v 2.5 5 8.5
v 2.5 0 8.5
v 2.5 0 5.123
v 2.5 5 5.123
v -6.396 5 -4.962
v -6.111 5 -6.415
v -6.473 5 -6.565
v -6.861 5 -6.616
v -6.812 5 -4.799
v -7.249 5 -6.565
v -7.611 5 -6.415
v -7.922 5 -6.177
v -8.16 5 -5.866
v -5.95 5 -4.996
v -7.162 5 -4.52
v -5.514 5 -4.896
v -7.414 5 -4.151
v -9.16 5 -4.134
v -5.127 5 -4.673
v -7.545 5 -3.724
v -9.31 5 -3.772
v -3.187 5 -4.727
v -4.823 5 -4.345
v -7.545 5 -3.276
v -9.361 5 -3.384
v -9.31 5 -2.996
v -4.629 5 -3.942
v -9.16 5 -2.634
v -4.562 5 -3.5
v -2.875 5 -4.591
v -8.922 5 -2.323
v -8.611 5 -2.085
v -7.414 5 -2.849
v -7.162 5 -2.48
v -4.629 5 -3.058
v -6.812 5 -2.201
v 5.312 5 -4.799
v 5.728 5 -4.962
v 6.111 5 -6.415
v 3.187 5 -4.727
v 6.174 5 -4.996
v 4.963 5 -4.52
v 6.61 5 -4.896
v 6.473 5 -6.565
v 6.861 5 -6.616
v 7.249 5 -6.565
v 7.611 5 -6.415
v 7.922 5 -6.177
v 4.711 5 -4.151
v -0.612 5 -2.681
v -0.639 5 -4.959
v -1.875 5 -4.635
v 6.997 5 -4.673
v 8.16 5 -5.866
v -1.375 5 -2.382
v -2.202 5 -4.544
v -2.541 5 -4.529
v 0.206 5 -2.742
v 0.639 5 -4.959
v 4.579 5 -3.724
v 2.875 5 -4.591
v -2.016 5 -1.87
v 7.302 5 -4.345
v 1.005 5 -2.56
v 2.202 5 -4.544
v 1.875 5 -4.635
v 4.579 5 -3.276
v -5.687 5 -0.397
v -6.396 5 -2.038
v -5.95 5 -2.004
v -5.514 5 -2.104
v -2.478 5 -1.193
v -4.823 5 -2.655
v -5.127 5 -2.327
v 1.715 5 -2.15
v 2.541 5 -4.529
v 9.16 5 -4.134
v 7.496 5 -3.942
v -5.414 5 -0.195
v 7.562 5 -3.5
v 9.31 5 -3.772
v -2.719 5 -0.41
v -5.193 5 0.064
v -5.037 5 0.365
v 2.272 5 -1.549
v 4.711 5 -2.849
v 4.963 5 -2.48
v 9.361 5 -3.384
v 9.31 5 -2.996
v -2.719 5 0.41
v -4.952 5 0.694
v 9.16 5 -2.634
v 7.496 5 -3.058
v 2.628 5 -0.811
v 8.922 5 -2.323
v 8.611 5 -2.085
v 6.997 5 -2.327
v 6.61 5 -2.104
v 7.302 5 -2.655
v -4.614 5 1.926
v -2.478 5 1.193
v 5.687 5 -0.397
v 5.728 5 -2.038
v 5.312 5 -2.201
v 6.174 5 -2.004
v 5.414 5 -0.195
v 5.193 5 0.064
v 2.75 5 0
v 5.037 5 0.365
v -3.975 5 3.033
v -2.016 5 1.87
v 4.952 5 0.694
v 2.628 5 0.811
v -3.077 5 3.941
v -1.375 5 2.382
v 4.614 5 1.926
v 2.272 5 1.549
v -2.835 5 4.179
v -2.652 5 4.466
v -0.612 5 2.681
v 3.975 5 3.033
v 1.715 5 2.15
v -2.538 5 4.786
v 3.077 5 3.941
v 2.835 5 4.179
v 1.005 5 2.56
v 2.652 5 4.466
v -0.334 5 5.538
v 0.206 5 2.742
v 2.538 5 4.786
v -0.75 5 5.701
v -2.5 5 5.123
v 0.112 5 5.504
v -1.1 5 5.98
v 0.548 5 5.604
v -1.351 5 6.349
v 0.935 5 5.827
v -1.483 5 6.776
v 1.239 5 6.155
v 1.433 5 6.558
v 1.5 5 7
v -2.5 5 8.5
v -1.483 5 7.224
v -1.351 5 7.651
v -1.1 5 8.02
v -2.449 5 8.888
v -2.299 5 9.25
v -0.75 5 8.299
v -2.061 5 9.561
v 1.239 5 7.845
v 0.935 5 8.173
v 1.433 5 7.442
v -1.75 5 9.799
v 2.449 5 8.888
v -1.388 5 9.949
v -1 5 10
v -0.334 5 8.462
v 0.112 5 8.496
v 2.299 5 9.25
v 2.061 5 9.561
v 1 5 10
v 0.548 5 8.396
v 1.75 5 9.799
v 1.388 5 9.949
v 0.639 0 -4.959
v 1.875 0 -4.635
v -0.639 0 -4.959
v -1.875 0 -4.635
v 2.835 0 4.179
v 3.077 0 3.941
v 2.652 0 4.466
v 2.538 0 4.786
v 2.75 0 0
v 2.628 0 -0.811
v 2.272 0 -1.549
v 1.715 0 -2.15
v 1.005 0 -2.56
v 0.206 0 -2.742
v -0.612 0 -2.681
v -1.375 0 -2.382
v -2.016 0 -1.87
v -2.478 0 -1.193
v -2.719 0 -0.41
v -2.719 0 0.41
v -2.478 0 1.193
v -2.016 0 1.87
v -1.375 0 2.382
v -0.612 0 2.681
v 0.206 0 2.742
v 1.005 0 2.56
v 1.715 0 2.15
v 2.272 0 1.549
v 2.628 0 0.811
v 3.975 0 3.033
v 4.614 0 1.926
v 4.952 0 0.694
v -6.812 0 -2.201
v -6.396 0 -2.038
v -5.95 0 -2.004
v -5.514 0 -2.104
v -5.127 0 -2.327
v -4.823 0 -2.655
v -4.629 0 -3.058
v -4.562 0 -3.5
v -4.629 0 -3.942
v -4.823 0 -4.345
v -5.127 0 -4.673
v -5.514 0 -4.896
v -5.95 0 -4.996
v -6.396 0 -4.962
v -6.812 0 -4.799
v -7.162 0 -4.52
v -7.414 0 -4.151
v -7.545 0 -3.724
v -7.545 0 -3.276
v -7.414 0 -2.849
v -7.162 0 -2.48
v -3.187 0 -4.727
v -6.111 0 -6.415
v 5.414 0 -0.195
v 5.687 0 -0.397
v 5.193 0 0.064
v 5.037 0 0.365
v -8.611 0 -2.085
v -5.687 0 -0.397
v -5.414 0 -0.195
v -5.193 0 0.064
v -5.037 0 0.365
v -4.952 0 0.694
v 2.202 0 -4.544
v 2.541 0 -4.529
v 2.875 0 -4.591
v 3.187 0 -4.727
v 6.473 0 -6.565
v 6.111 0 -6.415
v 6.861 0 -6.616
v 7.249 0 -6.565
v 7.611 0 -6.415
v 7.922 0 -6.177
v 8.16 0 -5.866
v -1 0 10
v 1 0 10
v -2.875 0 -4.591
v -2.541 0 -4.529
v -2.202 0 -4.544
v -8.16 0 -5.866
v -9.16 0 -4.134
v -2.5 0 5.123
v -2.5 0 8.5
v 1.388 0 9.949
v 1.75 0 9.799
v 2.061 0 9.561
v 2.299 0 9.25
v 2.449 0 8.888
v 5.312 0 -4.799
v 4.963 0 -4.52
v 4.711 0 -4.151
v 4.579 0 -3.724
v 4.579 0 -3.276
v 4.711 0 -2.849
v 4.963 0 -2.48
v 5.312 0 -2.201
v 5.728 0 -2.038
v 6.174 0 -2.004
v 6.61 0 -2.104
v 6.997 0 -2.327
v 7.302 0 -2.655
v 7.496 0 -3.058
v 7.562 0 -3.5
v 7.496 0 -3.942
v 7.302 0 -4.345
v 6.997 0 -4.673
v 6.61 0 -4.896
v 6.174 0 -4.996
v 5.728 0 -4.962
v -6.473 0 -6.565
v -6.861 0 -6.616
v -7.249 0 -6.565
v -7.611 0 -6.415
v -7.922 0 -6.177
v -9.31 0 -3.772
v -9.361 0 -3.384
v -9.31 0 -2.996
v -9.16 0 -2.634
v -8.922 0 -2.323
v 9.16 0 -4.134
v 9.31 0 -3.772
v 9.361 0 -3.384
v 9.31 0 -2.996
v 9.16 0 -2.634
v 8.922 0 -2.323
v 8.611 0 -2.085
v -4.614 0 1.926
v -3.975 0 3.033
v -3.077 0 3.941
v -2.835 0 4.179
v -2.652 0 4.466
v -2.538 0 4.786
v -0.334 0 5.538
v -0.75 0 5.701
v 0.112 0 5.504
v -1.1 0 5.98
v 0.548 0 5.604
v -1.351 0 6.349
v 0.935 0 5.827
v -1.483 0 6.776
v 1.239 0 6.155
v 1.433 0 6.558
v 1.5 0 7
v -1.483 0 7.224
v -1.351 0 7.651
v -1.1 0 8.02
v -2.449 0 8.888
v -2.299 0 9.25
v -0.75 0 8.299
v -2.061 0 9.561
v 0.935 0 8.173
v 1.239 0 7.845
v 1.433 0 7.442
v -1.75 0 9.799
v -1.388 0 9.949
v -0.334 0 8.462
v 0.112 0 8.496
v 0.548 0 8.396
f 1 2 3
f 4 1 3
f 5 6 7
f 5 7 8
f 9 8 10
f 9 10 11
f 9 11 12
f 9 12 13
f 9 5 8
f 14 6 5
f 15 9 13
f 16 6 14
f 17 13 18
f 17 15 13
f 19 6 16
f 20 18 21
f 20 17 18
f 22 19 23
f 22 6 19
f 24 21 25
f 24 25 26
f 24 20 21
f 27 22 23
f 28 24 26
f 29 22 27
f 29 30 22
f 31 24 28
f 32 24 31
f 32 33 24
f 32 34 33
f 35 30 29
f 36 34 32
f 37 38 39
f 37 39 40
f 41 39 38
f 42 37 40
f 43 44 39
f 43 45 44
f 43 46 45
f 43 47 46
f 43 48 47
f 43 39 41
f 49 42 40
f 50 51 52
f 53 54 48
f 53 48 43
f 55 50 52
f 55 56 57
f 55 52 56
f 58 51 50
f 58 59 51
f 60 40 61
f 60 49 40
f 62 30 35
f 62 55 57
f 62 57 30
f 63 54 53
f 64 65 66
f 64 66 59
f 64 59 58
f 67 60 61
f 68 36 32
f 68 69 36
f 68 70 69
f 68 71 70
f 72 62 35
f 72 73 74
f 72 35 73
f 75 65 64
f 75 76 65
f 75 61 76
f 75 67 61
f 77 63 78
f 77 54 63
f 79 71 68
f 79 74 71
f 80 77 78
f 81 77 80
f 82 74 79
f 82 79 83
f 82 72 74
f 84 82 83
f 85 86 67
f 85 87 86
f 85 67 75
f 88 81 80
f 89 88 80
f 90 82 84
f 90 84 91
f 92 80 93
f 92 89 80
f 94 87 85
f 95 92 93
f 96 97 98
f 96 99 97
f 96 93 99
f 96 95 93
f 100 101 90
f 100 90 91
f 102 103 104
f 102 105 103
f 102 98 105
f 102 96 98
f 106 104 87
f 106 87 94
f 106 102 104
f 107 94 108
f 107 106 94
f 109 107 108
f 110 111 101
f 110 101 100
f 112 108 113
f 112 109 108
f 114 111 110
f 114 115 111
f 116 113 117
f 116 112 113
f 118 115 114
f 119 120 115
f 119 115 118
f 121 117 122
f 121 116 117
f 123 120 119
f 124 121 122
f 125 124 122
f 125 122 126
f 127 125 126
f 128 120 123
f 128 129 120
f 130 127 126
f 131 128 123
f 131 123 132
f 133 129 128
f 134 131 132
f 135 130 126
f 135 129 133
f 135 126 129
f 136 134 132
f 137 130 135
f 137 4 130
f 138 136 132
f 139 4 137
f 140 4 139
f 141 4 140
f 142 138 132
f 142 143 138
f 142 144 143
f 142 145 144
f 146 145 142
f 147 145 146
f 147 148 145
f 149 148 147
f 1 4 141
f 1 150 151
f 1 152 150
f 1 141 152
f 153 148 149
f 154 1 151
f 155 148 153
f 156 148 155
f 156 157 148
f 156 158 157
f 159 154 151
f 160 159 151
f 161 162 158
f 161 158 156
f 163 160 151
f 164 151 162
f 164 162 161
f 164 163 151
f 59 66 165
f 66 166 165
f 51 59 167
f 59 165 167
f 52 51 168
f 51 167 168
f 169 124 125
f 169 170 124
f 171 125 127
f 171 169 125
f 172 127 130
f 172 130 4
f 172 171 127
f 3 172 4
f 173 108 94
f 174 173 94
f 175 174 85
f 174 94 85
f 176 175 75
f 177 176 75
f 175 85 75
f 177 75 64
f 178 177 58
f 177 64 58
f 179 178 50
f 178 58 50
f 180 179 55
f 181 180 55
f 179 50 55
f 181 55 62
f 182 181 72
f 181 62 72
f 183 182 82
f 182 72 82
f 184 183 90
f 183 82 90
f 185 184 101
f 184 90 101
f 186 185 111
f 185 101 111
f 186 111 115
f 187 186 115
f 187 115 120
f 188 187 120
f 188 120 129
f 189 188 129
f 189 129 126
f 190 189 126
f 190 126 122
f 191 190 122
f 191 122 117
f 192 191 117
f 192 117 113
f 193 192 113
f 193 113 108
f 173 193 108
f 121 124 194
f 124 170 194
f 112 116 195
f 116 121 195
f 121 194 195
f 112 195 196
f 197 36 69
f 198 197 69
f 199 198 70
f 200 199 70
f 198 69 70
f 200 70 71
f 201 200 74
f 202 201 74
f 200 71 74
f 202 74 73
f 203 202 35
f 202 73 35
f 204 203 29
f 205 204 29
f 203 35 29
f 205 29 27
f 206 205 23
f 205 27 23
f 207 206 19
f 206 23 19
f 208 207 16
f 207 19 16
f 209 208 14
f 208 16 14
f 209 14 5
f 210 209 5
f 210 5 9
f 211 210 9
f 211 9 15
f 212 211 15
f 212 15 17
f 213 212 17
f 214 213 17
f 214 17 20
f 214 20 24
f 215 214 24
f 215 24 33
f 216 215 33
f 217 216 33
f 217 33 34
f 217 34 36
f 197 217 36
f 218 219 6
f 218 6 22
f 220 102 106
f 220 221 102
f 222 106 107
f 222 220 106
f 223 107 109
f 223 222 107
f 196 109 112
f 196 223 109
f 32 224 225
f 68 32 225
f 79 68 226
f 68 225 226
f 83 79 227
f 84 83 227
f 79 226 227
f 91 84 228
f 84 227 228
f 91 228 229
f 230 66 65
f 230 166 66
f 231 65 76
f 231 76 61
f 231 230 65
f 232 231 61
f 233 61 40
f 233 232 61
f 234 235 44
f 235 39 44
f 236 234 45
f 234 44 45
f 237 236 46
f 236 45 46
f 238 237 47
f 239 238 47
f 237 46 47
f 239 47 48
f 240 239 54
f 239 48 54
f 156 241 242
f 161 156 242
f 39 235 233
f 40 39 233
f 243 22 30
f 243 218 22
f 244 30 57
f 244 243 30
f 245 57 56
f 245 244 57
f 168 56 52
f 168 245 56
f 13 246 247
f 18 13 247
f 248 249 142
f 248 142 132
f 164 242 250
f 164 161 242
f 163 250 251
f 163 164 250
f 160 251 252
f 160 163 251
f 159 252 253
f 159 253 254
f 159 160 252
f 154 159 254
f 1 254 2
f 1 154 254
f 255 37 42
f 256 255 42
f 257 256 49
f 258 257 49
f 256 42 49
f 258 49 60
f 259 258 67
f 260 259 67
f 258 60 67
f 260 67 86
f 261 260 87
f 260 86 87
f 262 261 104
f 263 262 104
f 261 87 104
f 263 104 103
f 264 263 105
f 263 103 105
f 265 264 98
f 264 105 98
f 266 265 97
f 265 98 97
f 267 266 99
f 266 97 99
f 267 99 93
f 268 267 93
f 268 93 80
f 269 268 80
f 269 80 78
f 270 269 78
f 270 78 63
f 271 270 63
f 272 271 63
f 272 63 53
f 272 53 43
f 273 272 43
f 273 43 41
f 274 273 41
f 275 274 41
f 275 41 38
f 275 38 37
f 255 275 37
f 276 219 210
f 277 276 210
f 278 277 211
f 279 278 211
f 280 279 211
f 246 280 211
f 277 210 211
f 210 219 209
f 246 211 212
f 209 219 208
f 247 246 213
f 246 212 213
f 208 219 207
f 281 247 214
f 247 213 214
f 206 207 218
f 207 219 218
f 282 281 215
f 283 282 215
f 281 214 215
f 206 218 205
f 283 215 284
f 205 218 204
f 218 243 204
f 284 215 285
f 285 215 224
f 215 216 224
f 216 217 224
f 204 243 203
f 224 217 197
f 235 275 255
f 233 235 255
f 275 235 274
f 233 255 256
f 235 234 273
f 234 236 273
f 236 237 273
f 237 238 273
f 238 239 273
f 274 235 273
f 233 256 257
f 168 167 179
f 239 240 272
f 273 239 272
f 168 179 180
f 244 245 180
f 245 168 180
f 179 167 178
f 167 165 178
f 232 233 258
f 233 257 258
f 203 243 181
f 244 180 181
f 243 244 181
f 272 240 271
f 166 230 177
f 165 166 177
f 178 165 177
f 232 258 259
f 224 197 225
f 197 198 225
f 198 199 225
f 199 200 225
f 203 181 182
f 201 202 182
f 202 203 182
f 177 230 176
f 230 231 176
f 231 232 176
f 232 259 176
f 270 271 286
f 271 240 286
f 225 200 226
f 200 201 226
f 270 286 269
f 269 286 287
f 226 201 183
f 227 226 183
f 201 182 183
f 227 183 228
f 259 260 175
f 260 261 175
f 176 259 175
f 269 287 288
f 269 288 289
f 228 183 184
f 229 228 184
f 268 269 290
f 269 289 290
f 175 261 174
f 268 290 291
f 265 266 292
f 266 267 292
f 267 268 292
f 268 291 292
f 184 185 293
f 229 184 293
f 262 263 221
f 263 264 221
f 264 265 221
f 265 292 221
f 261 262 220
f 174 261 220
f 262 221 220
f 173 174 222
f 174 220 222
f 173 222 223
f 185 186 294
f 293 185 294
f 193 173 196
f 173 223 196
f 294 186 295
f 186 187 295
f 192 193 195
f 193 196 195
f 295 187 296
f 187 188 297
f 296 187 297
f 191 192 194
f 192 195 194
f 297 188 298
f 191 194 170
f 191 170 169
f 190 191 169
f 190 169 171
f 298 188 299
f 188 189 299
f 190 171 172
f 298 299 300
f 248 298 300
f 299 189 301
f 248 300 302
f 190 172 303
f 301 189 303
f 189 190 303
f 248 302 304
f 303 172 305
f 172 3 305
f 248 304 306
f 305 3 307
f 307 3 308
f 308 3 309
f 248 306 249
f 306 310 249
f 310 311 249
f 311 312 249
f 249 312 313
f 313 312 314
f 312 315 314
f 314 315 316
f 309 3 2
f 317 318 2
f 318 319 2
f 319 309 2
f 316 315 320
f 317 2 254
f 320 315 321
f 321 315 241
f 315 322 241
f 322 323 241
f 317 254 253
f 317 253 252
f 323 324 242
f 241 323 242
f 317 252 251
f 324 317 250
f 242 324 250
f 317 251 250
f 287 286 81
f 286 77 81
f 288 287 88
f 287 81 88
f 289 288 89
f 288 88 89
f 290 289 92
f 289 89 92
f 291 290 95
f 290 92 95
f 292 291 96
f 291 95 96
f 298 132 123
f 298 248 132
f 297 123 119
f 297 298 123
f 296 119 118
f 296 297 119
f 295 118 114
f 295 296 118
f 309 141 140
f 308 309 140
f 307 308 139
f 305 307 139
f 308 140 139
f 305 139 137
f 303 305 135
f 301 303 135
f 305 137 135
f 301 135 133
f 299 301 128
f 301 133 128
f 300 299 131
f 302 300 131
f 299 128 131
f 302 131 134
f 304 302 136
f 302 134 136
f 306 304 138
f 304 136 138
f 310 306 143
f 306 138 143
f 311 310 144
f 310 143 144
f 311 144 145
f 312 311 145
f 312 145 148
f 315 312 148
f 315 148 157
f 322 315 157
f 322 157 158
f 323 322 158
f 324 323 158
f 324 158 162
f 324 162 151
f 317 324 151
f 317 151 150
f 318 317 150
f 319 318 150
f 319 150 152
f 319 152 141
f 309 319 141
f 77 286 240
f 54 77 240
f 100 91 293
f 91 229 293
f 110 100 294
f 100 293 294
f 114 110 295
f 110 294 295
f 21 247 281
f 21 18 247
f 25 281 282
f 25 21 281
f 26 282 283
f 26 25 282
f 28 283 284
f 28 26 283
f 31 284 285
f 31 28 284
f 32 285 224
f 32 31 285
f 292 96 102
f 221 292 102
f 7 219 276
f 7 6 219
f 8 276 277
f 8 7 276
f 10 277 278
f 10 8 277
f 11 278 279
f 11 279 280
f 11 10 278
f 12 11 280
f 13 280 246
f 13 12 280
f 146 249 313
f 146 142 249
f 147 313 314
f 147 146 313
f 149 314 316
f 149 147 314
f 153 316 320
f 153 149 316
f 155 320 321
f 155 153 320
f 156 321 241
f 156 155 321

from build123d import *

# Parameters (mm, degrees)
SKETCH1_R                = 5
BOSS_EXTRUDE1_DEPTH      = 5
SKETCH2_W                = 5
SKETCH2_H                = 10
BOSS_EXTRUDE2_DEPTH      = 5
SKETCH3_R                = 1.5
CUT_EXTRUDE1_DEPTH       = 6
FILLET1_R                = 1.5
CIRPATTERN1_COUNT        = 3
FILLET1_OF_CIRPATTERN1_R = 1.5
SKETCH4_R                = 2.75
CUT_EXTRUDE2_DEPTH       = 6


with BuildPart() as part:
    # Sketch1 → Boss-Extrude1 (new body)
    with BuildSketch(Plane(origin=(0, 0, 0), x_dir=(1, 0, 0), z_dir=(0, 1, 0))):
        Circle(SKETCH1_R)
    extrude(amount=BOSS_EXTRUDE1_DEPTH)

    # Sketch2 → Boss-Extrude2 (add)
    with BuildSketch(Plane(origin=(0, 0, 0), x_dir=(1, 0, 0), z_dir=(0, 1, 0))):
        with Locations((0, -5)):
            Rectangle(SKETCH2_W, SKETCH2_H)
    boss_extrude2 = extrude(amount=BOSS_EXTRUDE2_DEPTH)

    # Sketch3 → Cut-Extrude1 (cut, through all)
    with BuildSketch(Plane(origin=(0, 5, 0), x_dir=(1, 0, 0), z_dir=(0, 1, 0))):
        with Locations((0, -7)):
            Circle(SKETCH3_R)
    cut_extrude1 = extrude(amount=-CUT_EXTRUDE1_DEPTH, mode=Mode.SUBTRACT)

    # Fillet1
    fillet1_edges = [part.edges().sort_by_distance(p)[0] for p in [
        (2.5, 2.5, 4.330127019),
        (2.5, 2.5, 10),
        (-2.5, 2.5, 4.330127019),
        (-2.5, 2.5, 10),
    ]]
    fillet(fillet1_edges, radius=FILLET1_R)

    # CirPattern1: Boss-Extrude2, Cut-Extrude1 ×3 about axis
    cirpattern1_axis = Axis((0, 0, 0), (0, 1, 0))
    for i in range(1, CIRPATTERN1_COUNT):
        add(boss_extrude2.rotate(cirpattern1_axis, i * 360 / CIRPATTERN1_COUNT))
        add(cut_extrude1.rotate(cirpattern1_axis, i * 360 / CIRPATTERN1_COUNT), mode=Mode.SUBTRACT)

    # Fillet1 of CirPattern1
    fillet1_of_cirpattern1_edges = [part.edges().sort_by_distance(p)[0] for p in [
        (2.5, 2.5, -4.330127019),
        (7.410254038, 2.5, -7.165063509),
        (5, 2.5, 0),
        (9.910254038, 2.5, -2.834936491),
        (-5, 2.5, 0),
        (-9.910254038, 2.5, -2.834936491),
        (-2.5, 2.5, -4.330127019),
        (-7.410254038, 2.5, -7.165063509),
    ]]
    fillet(fillet1_of_cirpattern1_edges, radius=FILLET1_OF_CIRPATTERN1_R)

    # Sketch4 → Cut-Extrude2 (cut, through all)
    with BuildSketch(Plane(origin=(0, 5, 0), x_dir=(1, 0, 0), z_dir=(0, 1, 0))):
        Circle(SKETCH4_R)
    extrude(amount=-CUT_EXTRUDE2_DEPTH, mode=Mode.SUBTRACT)


solid = part.part
